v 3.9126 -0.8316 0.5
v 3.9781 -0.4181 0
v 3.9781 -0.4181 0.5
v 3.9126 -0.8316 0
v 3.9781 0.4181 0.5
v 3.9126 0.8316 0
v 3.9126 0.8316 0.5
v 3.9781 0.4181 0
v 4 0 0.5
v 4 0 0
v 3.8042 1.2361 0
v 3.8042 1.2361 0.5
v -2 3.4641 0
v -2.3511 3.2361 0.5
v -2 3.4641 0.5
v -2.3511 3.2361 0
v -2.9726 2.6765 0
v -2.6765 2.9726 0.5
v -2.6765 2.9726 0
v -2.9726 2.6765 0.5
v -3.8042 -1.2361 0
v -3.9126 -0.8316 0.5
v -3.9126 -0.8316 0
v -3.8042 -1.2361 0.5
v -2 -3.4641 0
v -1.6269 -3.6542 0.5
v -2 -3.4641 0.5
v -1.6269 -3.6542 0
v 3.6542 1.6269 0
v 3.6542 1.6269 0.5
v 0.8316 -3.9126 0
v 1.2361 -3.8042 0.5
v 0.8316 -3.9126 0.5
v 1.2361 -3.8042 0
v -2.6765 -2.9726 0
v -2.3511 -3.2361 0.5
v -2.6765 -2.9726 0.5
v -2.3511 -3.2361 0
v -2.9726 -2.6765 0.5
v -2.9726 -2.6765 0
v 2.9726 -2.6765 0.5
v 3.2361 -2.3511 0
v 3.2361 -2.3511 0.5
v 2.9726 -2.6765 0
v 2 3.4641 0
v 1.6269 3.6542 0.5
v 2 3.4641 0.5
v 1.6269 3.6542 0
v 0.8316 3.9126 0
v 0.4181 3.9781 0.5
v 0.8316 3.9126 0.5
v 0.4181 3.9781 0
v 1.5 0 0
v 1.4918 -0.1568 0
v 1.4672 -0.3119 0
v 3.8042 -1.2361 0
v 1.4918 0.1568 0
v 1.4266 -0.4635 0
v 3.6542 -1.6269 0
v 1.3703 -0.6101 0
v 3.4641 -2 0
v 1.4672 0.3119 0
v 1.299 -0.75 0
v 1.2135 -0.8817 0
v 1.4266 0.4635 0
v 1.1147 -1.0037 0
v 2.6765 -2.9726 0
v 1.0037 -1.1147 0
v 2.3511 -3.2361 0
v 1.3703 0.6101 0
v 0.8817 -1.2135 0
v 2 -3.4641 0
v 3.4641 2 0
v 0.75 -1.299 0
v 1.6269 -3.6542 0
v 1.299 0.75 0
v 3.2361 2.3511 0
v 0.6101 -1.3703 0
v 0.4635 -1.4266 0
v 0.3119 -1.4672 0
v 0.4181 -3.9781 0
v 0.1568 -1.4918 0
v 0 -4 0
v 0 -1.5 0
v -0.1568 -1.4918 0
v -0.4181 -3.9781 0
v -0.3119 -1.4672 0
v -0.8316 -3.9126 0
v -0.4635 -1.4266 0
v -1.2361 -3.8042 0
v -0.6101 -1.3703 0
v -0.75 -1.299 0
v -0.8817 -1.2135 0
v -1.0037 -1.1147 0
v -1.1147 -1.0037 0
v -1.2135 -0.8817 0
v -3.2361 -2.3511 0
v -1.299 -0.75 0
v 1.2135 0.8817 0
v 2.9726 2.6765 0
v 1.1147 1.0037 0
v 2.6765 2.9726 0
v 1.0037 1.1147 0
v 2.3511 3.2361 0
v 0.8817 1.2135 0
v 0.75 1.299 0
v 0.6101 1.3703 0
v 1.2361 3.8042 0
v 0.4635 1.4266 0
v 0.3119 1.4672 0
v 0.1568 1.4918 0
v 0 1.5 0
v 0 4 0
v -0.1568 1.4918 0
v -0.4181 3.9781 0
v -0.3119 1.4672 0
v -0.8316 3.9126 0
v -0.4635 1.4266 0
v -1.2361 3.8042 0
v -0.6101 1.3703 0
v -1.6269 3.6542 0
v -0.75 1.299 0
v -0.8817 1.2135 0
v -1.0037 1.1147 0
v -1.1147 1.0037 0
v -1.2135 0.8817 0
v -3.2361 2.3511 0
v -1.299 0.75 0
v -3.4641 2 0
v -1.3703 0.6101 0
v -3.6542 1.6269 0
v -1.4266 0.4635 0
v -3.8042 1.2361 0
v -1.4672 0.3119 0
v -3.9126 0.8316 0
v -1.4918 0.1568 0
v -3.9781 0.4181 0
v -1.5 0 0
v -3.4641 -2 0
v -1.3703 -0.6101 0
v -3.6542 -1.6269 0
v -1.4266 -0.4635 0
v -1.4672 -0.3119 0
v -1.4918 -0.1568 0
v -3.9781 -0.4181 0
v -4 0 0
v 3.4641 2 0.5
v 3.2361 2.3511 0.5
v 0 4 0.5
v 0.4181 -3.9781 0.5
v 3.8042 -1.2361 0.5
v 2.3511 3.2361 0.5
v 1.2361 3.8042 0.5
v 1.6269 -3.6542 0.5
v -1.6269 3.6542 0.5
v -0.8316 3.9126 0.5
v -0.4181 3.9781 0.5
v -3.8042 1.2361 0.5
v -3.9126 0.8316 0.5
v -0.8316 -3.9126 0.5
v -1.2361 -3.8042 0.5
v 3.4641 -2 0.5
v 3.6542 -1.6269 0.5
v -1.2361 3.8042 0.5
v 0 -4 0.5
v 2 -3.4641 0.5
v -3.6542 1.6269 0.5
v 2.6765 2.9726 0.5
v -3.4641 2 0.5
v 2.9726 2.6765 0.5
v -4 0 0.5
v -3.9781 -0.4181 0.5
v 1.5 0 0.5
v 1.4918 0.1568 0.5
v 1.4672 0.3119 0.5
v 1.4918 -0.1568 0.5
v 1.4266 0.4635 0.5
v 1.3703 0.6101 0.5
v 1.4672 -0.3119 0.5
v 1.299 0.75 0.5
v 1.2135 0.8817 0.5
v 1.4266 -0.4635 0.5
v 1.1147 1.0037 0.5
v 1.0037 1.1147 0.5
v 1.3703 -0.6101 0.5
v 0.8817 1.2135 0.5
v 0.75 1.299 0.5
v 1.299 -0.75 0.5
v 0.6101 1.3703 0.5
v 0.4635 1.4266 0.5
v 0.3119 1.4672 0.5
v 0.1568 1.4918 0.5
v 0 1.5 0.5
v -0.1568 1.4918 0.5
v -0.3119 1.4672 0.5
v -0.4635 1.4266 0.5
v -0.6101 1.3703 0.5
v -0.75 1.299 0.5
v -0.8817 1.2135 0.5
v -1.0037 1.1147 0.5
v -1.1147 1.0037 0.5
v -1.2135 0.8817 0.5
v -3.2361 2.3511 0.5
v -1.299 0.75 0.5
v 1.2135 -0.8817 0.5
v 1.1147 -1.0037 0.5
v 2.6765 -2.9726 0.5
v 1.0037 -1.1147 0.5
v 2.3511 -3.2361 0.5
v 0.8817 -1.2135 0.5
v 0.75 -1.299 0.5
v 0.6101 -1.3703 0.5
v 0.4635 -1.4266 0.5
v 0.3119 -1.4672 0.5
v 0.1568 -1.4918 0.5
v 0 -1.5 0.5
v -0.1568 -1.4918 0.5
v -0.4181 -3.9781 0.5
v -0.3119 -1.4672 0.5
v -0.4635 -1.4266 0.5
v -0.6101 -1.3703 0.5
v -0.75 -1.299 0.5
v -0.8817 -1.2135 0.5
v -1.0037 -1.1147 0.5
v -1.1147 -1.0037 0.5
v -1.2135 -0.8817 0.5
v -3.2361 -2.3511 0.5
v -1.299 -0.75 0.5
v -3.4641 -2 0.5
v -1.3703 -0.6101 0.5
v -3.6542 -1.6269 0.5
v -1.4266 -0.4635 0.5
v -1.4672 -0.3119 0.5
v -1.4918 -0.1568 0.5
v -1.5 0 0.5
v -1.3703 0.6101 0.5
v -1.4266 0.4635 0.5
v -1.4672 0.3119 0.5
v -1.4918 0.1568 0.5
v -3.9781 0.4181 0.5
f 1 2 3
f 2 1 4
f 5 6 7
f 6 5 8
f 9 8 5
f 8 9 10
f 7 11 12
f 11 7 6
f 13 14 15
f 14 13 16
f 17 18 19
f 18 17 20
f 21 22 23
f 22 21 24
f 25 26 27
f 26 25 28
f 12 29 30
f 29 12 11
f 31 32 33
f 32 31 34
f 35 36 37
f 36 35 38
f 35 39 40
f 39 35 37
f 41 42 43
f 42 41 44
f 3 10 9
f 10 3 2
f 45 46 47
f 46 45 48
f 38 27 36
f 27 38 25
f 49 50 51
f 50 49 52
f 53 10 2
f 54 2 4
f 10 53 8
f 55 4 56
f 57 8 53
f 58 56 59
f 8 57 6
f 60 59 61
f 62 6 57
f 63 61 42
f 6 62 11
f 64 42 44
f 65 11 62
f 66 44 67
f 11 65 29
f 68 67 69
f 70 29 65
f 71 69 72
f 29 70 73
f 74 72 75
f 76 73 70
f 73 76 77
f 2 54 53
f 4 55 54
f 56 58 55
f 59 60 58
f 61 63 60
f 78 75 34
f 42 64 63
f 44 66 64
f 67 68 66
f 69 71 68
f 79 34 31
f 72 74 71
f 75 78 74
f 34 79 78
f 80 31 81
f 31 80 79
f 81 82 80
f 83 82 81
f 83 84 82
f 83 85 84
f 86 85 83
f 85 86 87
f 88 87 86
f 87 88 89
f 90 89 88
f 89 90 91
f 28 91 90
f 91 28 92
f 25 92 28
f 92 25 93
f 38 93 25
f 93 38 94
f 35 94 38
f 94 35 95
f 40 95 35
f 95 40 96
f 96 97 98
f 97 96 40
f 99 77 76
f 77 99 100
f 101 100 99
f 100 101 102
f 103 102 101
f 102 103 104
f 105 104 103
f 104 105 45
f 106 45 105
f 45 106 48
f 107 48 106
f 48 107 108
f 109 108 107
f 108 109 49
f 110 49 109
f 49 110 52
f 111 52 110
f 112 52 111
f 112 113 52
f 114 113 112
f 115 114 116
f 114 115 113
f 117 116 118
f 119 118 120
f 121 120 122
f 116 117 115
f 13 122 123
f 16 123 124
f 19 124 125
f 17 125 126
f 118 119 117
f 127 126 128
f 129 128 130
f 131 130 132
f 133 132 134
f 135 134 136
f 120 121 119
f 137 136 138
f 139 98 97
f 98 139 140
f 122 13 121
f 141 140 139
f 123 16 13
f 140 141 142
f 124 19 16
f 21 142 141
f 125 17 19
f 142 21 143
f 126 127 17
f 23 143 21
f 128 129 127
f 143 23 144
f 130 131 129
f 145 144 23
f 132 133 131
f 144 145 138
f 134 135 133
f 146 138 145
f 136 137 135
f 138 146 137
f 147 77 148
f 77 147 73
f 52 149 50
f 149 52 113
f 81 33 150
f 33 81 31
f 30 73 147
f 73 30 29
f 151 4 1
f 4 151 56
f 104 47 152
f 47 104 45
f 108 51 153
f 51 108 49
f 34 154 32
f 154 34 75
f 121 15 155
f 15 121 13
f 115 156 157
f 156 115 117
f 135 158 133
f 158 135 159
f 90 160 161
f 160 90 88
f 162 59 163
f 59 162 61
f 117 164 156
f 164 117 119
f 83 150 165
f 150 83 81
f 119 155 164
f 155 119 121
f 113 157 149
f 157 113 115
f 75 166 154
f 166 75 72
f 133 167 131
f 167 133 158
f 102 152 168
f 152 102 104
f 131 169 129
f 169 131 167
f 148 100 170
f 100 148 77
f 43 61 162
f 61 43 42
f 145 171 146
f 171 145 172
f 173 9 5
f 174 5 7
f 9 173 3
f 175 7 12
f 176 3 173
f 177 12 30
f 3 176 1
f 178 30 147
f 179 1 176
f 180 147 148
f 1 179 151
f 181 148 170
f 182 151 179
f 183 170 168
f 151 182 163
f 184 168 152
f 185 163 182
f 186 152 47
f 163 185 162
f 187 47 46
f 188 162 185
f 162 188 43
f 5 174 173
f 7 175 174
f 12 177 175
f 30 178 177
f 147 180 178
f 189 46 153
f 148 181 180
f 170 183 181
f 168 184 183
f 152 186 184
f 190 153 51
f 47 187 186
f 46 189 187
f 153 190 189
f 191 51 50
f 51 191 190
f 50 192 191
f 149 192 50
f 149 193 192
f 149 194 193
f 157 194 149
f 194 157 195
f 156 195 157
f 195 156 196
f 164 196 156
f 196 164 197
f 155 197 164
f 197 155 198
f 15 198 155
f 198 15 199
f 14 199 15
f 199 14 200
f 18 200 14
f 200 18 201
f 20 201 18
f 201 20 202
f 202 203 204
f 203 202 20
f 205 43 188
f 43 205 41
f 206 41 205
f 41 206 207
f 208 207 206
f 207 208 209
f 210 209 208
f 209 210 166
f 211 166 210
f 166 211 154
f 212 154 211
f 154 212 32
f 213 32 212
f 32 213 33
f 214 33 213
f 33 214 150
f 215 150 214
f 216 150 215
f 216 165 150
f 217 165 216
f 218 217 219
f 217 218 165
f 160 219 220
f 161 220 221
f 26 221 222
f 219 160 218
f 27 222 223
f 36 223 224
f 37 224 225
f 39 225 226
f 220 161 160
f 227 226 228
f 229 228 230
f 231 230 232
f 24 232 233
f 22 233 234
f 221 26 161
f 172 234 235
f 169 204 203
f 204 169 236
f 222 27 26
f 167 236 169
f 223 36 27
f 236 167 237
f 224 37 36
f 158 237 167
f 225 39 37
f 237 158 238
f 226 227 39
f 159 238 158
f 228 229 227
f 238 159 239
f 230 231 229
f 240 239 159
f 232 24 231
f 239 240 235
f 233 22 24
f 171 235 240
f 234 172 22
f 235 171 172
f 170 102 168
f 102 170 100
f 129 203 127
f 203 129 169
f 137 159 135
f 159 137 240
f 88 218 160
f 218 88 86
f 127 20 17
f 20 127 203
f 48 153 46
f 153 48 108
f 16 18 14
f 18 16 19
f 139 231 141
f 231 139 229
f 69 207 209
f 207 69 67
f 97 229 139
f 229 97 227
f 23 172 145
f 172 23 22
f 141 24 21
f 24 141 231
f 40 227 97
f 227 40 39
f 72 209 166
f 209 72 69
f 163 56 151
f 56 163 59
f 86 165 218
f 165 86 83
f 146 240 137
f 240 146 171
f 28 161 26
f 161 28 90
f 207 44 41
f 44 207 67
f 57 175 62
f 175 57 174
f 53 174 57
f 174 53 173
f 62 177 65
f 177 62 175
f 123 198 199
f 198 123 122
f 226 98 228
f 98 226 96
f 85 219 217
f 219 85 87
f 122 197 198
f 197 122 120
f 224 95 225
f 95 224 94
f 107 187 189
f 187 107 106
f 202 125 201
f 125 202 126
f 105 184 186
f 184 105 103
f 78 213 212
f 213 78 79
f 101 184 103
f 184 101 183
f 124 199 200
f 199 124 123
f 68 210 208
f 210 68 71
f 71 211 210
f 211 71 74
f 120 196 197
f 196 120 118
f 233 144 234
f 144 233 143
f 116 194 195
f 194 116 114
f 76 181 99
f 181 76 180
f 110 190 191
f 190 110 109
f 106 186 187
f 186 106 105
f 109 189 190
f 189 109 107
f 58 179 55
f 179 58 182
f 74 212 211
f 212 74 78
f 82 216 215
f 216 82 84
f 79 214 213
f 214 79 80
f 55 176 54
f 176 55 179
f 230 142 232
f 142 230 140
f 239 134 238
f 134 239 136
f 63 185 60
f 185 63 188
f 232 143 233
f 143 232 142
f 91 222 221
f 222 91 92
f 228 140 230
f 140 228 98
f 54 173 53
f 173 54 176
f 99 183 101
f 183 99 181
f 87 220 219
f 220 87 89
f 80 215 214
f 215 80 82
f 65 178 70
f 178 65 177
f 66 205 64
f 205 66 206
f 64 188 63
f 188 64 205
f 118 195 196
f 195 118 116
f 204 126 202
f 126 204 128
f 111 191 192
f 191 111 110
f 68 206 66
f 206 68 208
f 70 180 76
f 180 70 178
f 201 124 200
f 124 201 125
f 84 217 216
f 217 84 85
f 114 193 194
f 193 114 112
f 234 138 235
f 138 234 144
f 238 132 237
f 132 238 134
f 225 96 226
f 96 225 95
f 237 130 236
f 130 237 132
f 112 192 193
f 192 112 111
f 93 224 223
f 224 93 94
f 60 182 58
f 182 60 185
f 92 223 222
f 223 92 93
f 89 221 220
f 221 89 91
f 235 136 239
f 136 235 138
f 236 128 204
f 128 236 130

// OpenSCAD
// Precision shim ring.
$fn = 60;
eps = 0.02;
inner_d = 3;
outer_d = 8;
thickness = 0.5;
difference() {
    cylinder(d = outer_d, h = thickness);
    translate([0, 0, -eps]) cylinder(d = inner_d, h = thickness + 2 * eps);
}
